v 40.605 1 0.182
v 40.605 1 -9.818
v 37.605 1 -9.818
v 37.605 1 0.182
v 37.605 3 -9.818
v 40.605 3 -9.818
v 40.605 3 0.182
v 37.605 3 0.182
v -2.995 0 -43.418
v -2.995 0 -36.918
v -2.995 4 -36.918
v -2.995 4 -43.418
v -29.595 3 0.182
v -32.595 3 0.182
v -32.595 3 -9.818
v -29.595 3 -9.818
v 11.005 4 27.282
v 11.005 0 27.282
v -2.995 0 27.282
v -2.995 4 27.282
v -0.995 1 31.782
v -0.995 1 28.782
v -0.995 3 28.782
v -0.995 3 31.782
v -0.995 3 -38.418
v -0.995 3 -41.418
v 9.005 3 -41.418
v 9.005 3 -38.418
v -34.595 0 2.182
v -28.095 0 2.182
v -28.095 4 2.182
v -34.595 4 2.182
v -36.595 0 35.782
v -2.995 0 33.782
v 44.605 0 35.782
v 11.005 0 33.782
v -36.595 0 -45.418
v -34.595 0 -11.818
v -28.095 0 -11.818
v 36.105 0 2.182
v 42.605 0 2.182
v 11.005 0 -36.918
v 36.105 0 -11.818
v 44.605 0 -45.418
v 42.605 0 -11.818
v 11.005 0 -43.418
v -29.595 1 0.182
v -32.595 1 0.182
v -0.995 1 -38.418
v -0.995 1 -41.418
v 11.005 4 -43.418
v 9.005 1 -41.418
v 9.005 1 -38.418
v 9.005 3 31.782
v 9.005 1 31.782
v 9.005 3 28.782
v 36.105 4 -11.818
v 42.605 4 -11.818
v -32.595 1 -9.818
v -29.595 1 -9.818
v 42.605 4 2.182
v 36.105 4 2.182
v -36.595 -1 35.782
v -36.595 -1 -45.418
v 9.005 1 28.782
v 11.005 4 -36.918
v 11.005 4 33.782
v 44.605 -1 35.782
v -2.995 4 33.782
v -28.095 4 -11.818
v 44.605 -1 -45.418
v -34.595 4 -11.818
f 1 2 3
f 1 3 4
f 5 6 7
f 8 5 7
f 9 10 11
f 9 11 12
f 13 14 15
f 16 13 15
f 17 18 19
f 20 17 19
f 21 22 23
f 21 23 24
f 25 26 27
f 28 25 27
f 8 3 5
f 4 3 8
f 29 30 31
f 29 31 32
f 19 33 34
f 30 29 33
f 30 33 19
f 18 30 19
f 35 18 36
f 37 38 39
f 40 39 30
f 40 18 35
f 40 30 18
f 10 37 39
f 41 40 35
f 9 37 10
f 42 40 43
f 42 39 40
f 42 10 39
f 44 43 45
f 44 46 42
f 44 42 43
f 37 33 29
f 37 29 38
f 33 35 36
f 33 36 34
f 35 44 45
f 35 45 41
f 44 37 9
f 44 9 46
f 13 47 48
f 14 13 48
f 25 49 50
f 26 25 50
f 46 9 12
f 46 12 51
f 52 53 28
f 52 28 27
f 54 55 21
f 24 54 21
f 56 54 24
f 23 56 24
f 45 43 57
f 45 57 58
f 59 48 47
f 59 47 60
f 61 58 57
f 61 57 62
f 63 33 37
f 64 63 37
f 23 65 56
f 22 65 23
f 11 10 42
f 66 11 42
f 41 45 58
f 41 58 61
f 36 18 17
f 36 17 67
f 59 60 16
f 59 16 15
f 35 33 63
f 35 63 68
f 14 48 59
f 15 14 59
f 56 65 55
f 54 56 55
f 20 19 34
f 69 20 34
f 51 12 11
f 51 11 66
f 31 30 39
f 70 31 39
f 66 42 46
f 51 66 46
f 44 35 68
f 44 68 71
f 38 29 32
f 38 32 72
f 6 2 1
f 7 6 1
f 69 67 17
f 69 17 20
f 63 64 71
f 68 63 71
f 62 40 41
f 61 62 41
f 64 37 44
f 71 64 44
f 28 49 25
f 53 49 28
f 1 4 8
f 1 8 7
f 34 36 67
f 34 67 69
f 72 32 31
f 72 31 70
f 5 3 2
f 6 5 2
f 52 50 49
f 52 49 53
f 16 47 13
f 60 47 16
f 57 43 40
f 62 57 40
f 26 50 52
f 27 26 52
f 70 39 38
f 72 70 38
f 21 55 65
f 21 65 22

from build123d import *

# Parameters (mm, degrees)
SKETCH1_W           = 81.2
SKETCH1_H           = 81.2
BOSS_EXTRUDE1_DEPTH = 1
SKETCH1_4_W         = 14
SKETCH1_4_H         = 6.5
BOSS_EXTRUDE3_DEPTH = 4
CUT_EXTRUDE1_START  = 1
SKETCH1_5_W         = 10
SKETCH1_5_H         = 3
CUT_EXTRUDE1_DEPTH  = 2
CIRPATTERN2_COUNT   = 4


with BuildPart() as part:
    # Sketch1 → Boss-Extrude1 (new body)
    with BuildSketch(Plane(origin=(0, 0, 0), x_dir=(1, 0, 0), z_dir=(0, 1, 0))):
        with Locations((4.005258085, 4.818334453)):
            Rectangle(SKETCH1_W, SKETCH1_H)
    extrude(amount=-BOSS_EXTRUDE1_DEPTH)

    # Sketch1<4> → Boss-Extrude3 (add)
    with BuildSketch(Plane(origin=(0, 0, 0), x_dir=(1, 0, 0), z_dir=(0, 1, 0))):
        with Locations((4.005258085, 40.168334453)):
            Rectangle(SKETCH1_4_W, SKETCH1_4_H)
    boss_extrude3 = extrude(amount=BOSS_EXTRUDE3_DEPTH)

    # Sketch1<5> → Cut-Extrude1 (cut)
    with BuildSketch(Plane(origin=(0, 0, 0), x_dir=(1, 0, 0), z_dir=(0, 1, 0)).offset(CUT_EXTRUDE1_START)):
        with Locations((4.005258085, 39.918334453)):
            Rectangle(SKETCH1_5_W, SKETCH1_5_H)
    cut_extrude1 = extrude(amount=CUT_EXTRUDE1_DEPTH, mode=Mode.SUBTRACT)

    # CirPattern2: Boss-Extrude3, Cut-Extrude1 ×4 about axis
    cirpattern2_axis = Axis((4.005258085, 0, -4.818334453), (0, 1, 0))
    add([boss_extrude3.rotate(cirpattern2_axis, i * 360 / CIRPATTERN2_COUNT) for i in range(1, CIRPATTERN2_COUNT)])
    add([cut_extrude1.rotate(cirpattern2_axis, i * 360 / CIRPATTERN2_COUNT) for i in range(1, CIRPATTERN2_COUNT)], mode=Mode.SUBTRACT)


solid = part.part
